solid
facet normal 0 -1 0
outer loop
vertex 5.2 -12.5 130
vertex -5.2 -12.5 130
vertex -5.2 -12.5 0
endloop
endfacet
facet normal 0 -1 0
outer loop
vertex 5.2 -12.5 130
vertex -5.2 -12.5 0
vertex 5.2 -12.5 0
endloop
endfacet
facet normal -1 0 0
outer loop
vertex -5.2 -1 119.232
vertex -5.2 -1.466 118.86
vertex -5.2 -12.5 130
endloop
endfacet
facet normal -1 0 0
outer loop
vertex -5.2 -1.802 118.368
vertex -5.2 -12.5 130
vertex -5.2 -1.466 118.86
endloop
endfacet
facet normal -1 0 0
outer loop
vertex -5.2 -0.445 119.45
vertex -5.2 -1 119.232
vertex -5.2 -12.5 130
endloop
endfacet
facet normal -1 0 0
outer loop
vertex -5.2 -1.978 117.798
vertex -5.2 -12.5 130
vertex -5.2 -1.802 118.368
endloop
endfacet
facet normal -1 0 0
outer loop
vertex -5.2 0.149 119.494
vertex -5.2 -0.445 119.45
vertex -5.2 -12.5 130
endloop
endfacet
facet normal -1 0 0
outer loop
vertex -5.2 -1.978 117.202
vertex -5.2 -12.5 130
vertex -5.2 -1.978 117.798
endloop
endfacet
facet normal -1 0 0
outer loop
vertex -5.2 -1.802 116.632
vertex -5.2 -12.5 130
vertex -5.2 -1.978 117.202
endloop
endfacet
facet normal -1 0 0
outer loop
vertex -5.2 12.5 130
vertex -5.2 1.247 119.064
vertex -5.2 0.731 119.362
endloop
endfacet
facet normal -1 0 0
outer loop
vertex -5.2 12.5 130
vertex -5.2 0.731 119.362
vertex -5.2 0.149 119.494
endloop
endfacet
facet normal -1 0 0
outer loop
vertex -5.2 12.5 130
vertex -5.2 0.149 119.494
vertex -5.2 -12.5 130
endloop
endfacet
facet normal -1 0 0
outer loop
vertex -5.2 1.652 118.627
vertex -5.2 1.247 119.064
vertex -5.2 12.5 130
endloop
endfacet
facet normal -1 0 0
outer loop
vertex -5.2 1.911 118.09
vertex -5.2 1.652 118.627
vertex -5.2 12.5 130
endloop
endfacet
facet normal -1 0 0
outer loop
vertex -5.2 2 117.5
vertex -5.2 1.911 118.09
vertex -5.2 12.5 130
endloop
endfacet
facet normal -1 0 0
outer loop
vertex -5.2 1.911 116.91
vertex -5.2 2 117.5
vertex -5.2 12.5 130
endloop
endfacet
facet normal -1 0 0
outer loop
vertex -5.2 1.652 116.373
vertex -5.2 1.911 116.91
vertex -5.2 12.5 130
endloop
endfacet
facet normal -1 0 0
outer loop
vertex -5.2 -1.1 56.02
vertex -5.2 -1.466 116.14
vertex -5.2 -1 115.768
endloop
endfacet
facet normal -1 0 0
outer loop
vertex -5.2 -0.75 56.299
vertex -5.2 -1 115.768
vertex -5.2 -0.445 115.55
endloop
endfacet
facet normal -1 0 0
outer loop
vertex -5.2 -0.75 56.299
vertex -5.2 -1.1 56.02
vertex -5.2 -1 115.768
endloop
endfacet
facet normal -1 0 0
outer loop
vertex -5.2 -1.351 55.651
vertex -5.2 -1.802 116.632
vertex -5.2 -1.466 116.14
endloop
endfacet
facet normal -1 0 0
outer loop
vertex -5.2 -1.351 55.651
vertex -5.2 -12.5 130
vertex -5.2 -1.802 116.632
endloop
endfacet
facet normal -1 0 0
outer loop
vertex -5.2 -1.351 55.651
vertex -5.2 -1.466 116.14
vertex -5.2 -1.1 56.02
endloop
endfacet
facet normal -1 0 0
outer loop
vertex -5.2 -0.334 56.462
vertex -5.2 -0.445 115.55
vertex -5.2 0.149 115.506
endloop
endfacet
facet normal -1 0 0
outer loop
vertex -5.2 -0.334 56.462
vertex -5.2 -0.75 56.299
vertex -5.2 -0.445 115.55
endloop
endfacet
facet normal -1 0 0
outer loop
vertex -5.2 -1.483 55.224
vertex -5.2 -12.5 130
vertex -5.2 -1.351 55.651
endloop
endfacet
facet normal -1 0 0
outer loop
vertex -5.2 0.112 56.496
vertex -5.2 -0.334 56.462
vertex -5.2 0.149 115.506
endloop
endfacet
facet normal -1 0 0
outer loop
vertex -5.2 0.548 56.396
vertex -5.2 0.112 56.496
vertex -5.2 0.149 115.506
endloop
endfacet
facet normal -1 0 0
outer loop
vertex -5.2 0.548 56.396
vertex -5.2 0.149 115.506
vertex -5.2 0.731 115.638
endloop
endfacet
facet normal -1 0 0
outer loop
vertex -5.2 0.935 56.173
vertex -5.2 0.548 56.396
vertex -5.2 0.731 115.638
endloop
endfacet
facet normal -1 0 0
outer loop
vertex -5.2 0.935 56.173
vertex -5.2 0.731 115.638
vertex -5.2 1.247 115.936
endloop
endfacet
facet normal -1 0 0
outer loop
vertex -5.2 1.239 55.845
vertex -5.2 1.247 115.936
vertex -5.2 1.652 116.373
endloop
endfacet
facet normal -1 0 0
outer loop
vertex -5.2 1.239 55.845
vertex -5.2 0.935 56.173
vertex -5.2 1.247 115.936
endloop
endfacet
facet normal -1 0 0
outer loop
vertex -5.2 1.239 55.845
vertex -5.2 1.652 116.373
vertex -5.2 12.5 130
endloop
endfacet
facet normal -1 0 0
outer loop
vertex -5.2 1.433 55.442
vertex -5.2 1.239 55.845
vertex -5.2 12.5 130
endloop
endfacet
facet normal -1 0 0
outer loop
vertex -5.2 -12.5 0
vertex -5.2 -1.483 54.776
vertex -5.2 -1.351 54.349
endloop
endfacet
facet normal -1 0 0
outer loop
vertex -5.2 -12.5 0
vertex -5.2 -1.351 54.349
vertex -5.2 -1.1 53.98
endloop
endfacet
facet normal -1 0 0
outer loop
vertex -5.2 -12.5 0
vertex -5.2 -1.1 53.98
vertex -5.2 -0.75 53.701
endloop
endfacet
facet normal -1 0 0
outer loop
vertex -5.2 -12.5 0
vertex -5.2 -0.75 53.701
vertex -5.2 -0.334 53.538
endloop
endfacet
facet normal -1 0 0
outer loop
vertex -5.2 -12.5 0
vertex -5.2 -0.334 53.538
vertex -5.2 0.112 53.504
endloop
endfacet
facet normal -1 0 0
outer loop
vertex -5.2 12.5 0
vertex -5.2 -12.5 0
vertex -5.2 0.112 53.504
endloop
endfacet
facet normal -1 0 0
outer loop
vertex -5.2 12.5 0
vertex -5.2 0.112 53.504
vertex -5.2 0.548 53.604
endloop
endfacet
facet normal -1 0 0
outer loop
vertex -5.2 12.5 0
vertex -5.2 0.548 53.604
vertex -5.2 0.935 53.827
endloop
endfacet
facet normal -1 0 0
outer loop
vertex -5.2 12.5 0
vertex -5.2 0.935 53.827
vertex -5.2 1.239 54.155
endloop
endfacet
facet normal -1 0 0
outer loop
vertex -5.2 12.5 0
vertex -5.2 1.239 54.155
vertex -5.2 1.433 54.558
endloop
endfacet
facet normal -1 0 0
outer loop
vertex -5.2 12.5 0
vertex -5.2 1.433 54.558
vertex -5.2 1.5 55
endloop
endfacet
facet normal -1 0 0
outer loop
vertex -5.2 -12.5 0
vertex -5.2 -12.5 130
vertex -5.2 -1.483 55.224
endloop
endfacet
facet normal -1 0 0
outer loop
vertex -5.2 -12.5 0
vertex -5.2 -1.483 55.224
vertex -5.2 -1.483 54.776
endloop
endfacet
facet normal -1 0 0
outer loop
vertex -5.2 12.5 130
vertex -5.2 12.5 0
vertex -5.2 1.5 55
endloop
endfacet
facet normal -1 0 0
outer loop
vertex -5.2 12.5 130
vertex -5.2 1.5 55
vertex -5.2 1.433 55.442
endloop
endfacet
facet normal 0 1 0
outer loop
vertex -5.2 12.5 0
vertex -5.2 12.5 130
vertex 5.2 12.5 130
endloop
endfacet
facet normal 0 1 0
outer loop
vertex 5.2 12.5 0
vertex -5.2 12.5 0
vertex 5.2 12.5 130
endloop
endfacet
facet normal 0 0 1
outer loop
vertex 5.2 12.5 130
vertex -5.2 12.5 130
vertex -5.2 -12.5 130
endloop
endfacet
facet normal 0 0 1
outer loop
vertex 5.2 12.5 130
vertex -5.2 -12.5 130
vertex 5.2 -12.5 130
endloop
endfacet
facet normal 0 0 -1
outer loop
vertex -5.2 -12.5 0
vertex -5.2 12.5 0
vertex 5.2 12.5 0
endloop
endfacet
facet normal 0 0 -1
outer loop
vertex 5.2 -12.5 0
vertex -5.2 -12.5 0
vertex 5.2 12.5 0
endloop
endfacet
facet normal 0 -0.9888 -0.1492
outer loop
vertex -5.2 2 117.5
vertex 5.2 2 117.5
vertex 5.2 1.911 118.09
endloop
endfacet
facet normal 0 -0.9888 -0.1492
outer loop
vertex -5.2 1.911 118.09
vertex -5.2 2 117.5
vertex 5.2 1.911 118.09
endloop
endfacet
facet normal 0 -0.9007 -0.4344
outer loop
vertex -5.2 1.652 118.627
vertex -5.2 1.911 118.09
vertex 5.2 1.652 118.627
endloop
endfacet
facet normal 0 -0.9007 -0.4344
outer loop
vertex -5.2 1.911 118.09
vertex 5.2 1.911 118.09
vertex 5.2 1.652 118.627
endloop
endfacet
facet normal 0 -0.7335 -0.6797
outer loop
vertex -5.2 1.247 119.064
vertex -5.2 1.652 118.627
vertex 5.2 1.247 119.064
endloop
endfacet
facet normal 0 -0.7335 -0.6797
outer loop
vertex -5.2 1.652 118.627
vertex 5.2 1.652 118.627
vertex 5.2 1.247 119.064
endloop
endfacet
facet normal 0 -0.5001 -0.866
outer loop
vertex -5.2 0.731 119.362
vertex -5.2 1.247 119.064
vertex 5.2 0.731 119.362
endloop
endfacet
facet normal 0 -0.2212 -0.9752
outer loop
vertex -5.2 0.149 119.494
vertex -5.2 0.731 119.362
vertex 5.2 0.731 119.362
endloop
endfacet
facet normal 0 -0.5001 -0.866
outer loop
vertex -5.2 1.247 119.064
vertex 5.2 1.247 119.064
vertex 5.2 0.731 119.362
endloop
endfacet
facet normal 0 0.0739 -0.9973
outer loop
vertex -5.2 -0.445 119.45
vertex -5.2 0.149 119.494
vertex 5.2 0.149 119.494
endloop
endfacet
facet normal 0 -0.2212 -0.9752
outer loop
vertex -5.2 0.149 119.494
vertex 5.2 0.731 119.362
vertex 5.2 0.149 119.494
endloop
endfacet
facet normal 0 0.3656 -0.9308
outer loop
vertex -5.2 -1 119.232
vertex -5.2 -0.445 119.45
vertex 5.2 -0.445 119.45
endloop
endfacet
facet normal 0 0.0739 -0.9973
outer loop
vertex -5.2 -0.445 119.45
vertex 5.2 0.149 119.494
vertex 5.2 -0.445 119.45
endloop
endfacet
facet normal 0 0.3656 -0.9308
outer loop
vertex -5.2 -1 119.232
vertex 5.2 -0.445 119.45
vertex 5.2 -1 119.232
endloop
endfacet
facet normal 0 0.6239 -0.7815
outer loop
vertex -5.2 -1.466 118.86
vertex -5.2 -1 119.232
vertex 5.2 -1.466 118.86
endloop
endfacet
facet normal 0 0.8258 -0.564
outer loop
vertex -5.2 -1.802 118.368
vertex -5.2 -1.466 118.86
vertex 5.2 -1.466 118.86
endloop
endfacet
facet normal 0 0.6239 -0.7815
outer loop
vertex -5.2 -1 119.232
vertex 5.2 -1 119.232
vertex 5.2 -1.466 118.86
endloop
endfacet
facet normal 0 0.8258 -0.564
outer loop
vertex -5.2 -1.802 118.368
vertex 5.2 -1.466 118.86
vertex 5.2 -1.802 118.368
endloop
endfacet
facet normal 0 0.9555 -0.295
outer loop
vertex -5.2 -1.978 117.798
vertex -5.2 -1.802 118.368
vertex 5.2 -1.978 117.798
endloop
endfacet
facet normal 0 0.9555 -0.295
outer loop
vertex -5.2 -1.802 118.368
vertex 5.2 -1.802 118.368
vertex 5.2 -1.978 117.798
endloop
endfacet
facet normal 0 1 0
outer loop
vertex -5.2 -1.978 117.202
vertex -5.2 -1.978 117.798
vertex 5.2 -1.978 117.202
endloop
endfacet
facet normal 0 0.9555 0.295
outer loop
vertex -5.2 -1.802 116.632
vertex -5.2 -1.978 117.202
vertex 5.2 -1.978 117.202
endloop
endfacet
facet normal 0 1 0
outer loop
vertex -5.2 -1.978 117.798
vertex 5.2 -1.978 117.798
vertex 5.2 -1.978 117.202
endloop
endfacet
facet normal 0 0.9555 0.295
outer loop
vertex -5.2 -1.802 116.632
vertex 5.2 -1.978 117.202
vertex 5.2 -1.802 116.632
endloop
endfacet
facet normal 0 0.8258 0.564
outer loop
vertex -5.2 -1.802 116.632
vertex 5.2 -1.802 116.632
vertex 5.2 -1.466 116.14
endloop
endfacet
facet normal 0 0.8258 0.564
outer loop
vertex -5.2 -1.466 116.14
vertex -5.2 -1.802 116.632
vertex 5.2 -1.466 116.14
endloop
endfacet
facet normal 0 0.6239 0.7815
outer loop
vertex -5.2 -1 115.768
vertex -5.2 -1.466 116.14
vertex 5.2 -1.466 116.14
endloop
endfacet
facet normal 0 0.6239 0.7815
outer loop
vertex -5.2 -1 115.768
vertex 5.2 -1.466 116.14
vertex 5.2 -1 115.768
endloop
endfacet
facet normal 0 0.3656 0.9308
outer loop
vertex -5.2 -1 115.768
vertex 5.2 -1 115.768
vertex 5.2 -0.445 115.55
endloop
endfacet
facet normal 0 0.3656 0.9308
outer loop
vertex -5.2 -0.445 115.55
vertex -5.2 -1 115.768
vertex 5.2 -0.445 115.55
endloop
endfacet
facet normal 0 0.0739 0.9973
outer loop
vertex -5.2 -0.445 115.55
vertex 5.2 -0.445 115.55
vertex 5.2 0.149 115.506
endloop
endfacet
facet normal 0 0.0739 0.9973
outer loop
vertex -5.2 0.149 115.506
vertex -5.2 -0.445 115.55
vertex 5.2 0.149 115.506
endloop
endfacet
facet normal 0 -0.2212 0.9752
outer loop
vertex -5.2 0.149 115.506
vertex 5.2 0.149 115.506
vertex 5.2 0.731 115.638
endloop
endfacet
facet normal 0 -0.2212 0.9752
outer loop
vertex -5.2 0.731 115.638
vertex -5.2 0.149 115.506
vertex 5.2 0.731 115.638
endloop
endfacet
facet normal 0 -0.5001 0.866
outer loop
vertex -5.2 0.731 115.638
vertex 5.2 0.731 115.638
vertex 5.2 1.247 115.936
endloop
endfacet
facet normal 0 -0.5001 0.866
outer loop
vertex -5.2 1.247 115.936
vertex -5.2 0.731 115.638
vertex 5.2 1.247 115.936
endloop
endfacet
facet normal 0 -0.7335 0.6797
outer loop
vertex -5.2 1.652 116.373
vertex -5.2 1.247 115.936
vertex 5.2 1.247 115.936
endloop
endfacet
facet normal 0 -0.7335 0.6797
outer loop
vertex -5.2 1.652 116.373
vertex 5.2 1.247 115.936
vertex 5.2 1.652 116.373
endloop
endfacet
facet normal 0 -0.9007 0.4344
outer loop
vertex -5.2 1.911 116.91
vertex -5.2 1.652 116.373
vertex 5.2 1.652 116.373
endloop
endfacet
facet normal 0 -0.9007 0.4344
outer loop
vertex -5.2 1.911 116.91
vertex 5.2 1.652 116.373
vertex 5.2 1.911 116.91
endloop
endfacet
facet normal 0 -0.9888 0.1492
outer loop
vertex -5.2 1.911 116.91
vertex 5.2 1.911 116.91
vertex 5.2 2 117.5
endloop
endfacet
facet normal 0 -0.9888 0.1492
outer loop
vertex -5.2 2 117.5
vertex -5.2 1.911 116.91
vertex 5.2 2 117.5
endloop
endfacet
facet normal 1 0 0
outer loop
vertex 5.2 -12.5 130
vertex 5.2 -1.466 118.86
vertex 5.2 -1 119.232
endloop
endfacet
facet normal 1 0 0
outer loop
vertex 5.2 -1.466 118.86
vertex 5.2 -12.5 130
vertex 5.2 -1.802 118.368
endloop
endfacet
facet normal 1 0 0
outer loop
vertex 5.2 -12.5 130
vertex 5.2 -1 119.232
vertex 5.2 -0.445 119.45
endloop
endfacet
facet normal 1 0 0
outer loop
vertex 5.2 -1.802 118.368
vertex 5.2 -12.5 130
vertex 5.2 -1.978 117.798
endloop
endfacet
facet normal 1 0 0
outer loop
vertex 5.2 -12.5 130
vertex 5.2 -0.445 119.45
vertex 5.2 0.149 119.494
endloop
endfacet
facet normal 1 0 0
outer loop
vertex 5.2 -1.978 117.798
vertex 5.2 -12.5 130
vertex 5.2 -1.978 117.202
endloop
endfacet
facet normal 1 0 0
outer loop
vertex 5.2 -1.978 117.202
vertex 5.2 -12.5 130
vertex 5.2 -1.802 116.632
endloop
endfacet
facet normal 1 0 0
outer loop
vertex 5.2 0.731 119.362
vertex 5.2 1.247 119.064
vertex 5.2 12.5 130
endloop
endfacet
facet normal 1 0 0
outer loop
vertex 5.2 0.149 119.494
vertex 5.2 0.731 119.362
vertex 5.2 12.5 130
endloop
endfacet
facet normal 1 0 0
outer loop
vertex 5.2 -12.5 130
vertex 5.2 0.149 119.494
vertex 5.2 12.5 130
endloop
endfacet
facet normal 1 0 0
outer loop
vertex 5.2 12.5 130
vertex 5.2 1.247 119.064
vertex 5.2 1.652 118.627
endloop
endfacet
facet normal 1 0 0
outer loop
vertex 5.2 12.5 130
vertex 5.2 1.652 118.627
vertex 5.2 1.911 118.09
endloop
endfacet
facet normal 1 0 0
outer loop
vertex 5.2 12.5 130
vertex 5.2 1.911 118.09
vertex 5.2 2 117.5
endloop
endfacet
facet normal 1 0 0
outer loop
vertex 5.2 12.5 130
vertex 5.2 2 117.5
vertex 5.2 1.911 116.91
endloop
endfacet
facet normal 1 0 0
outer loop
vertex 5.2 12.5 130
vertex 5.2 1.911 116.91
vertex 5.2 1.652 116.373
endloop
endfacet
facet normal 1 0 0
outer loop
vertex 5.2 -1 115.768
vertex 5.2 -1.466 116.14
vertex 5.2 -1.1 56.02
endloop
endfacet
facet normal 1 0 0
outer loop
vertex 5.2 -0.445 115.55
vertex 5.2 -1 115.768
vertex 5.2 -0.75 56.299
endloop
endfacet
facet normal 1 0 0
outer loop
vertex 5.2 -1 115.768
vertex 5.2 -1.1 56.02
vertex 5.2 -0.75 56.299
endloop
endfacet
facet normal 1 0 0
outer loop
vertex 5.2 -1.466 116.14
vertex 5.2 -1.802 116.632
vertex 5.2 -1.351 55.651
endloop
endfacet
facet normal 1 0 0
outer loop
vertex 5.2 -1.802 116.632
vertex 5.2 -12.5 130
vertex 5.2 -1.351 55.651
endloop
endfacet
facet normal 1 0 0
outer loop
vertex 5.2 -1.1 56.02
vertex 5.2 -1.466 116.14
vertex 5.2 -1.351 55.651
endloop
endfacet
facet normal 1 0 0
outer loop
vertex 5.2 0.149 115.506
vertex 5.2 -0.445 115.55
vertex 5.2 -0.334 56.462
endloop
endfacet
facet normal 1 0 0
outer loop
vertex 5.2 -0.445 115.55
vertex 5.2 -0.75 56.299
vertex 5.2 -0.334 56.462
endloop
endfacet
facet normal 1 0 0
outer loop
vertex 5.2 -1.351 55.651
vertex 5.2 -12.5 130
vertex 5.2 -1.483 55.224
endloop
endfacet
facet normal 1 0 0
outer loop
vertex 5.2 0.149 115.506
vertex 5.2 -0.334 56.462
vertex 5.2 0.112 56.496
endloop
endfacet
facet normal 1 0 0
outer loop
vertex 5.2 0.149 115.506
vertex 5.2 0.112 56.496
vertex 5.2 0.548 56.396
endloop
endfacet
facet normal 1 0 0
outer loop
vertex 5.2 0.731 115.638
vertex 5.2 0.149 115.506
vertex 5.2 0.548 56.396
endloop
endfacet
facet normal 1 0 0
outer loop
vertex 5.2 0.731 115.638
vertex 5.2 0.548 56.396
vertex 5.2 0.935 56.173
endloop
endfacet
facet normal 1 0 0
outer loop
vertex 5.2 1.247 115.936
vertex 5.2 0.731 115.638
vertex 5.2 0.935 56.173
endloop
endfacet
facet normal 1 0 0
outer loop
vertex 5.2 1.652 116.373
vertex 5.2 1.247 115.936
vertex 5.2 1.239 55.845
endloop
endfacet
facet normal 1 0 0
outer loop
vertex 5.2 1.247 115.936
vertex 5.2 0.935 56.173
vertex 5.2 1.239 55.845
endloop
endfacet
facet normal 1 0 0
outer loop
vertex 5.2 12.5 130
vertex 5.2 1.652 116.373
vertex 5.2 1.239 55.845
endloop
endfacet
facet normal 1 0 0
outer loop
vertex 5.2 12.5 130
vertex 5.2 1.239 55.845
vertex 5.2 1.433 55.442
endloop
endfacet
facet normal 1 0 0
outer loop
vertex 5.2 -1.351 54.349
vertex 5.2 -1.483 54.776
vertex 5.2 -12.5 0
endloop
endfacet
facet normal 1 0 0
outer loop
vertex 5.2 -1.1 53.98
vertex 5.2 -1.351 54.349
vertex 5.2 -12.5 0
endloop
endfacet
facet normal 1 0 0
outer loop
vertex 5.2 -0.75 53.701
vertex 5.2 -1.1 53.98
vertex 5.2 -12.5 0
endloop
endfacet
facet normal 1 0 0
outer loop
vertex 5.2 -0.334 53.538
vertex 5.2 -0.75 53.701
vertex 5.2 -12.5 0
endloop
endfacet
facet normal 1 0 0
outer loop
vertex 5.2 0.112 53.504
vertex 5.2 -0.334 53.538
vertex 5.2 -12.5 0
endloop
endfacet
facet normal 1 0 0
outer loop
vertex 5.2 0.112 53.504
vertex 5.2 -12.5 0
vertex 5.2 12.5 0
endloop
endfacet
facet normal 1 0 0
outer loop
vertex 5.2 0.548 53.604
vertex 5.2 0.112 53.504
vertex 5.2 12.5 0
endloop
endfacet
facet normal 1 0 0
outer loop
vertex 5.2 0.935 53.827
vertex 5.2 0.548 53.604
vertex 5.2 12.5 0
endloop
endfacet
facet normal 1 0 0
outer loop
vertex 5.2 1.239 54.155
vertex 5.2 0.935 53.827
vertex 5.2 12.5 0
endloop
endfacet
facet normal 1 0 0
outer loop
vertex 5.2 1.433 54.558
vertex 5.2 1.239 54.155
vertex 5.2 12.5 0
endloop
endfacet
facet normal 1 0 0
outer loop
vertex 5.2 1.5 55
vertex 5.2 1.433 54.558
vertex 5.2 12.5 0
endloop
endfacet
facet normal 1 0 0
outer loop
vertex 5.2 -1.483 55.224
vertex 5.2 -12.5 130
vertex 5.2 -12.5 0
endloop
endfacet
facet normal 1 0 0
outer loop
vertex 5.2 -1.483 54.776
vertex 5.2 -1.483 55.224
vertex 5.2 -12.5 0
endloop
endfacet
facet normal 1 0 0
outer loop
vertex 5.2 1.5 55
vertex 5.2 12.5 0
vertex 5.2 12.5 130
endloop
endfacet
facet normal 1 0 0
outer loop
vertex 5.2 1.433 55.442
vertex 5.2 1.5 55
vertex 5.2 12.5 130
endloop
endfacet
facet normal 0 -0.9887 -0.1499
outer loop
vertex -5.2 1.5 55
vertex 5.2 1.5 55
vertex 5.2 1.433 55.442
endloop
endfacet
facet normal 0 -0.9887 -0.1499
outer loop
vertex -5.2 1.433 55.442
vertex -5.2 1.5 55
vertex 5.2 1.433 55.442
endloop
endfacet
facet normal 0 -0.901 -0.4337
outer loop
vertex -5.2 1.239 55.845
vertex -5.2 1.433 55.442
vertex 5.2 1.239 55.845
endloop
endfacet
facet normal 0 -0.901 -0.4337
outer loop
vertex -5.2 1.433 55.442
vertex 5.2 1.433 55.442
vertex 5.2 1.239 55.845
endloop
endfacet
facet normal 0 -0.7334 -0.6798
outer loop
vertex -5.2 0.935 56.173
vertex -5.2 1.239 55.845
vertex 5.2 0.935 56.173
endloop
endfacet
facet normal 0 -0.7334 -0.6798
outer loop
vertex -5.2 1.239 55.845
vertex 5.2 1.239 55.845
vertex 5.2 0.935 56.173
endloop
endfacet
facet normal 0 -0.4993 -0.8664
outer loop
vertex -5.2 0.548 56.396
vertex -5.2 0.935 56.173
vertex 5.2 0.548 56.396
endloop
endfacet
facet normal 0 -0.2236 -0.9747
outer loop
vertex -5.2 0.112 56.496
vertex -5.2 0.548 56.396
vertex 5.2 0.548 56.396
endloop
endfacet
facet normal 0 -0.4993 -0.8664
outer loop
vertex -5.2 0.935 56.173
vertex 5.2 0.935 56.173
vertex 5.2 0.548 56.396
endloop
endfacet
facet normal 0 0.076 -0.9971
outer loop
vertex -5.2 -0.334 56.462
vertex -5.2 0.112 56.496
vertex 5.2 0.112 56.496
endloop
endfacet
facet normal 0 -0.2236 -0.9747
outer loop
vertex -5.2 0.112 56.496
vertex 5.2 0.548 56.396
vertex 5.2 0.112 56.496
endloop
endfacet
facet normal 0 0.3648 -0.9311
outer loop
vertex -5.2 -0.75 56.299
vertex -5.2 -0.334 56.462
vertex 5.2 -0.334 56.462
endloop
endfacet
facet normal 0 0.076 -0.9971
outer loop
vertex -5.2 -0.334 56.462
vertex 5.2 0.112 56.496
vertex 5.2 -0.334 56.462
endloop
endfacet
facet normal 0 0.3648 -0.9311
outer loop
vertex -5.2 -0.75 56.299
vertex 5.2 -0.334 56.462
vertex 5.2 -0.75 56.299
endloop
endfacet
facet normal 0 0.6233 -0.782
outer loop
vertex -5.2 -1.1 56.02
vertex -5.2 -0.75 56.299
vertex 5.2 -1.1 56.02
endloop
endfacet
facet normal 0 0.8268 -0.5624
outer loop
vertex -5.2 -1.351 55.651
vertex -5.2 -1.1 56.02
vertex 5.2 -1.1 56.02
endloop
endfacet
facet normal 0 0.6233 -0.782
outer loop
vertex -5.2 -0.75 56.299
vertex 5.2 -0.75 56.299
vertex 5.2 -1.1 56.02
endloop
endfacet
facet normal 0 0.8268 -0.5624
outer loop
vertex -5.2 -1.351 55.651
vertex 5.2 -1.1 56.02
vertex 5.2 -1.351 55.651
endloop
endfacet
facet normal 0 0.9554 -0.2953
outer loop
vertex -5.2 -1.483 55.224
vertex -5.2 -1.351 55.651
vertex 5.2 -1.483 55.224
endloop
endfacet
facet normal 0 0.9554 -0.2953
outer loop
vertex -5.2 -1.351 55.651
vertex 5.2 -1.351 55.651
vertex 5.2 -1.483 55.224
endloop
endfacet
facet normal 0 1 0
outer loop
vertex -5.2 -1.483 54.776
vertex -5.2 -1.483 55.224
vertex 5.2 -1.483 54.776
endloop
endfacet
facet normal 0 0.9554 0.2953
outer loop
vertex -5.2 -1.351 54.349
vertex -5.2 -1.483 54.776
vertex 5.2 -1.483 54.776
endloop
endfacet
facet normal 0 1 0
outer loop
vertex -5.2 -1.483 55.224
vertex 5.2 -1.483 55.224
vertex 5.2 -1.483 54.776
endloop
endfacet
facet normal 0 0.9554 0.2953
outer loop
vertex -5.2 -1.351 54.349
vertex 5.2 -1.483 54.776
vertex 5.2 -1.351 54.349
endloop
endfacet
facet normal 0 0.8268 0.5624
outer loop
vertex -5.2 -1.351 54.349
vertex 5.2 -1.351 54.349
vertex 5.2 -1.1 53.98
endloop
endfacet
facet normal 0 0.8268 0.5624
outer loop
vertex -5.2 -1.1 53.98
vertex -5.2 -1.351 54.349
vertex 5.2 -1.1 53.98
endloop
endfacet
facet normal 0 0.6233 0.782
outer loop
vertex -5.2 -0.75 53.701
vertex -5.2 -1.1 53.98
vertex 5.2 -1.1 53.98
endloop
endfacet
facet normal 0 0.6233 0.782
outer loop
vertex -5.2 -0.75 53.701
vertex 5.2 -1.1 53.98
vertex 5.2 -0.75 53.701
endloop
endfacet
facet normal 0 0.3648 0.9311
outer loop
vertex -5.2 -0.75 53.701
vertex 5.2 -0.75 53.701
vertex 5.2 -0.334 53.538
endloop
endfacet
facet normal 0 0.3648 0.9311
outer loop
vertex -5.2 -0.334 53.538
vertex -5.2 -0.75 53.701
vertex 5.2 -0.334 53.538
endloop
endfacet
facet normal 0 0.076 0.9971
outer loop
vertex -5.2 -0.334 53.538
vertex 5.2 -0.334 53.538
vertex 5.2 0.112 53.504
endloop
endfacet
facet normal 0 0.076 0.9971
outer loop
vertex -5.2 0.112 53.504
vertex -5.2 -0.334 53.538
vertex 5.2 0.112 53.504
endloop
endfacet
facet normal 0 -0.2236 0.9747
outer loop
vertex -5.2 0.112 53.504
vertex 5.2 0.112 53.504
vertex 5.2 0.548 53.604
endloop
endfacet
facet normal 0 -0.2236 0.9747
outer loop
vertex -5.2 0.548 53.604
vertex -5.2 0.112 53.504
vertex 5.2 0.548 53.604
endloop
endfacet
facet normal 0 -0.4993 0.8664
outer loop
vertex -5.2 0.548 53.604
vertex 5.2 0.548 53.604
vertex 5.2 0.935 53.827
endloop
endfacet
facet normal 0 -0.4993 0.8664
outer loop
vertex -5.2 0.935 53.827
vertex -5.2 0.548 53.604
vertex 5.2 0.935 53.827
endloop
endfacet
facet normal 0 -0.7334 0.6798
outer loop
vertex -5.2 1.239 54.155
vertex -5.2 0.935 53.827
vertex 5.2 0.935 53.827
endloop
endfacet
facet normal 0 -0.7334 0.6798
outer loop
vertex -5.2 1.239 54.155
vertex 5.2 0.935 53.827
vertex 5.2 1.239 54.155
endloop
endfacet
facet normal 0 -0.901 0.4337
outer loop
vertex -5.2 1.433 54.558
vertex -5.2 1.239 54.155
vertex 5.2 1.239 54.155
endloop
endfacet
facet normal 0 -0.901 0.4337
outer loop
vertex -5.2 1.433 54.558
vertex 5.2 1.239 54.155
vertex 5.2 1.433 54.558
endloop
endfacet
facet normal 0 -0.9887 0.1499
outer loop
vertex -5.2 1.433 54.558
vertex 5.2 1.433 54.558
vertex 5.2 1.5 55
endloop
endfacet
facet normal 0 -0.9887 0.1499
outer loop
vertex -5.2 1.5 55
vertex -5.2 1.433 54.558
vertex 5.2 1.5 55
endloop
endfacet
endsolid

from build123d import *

# Parameters (mm, degrees)
SKETCH_W        = 10.4
SKETCH_H        = 25
PAD_DEPTH       = 130
SKETCH001_R     = 1.5
POCKET_DEPTH    = 100
SKETCH002_R     = 2
POCKET001_DEPTH = 100


with BuildPart() as part:
    # Sketch → Pad (new body)
    with BuildSketch(Plane.XY):
        Rectangle(SKETCH_W, SKETCH_H)
    extrude(amount=PAD_DEPTH)

    # Sketch001 (on Face2 of Pad) → Pocket (cut)
    with BuildSketch(Plane.YZ.offset(5.2)):
        with Locations((0, 55)):
            Circle(SKETCH001_R)
    extrude(amount=-POCKET_DEPTH, mode=Mode.SUBTRACT)

    # Sketch002 (on Face3 of Pocket) → Pocket001 (cut)
    with BuildSketch(Plane.YZ.offset(5.2)):
        with Locations((0, 117.5)):
            Circle(SKETCH002_R)
    extrude(amount=-POCKET001_DEPTH, mode=Mode.SUBTRACT)


solid = part.part
